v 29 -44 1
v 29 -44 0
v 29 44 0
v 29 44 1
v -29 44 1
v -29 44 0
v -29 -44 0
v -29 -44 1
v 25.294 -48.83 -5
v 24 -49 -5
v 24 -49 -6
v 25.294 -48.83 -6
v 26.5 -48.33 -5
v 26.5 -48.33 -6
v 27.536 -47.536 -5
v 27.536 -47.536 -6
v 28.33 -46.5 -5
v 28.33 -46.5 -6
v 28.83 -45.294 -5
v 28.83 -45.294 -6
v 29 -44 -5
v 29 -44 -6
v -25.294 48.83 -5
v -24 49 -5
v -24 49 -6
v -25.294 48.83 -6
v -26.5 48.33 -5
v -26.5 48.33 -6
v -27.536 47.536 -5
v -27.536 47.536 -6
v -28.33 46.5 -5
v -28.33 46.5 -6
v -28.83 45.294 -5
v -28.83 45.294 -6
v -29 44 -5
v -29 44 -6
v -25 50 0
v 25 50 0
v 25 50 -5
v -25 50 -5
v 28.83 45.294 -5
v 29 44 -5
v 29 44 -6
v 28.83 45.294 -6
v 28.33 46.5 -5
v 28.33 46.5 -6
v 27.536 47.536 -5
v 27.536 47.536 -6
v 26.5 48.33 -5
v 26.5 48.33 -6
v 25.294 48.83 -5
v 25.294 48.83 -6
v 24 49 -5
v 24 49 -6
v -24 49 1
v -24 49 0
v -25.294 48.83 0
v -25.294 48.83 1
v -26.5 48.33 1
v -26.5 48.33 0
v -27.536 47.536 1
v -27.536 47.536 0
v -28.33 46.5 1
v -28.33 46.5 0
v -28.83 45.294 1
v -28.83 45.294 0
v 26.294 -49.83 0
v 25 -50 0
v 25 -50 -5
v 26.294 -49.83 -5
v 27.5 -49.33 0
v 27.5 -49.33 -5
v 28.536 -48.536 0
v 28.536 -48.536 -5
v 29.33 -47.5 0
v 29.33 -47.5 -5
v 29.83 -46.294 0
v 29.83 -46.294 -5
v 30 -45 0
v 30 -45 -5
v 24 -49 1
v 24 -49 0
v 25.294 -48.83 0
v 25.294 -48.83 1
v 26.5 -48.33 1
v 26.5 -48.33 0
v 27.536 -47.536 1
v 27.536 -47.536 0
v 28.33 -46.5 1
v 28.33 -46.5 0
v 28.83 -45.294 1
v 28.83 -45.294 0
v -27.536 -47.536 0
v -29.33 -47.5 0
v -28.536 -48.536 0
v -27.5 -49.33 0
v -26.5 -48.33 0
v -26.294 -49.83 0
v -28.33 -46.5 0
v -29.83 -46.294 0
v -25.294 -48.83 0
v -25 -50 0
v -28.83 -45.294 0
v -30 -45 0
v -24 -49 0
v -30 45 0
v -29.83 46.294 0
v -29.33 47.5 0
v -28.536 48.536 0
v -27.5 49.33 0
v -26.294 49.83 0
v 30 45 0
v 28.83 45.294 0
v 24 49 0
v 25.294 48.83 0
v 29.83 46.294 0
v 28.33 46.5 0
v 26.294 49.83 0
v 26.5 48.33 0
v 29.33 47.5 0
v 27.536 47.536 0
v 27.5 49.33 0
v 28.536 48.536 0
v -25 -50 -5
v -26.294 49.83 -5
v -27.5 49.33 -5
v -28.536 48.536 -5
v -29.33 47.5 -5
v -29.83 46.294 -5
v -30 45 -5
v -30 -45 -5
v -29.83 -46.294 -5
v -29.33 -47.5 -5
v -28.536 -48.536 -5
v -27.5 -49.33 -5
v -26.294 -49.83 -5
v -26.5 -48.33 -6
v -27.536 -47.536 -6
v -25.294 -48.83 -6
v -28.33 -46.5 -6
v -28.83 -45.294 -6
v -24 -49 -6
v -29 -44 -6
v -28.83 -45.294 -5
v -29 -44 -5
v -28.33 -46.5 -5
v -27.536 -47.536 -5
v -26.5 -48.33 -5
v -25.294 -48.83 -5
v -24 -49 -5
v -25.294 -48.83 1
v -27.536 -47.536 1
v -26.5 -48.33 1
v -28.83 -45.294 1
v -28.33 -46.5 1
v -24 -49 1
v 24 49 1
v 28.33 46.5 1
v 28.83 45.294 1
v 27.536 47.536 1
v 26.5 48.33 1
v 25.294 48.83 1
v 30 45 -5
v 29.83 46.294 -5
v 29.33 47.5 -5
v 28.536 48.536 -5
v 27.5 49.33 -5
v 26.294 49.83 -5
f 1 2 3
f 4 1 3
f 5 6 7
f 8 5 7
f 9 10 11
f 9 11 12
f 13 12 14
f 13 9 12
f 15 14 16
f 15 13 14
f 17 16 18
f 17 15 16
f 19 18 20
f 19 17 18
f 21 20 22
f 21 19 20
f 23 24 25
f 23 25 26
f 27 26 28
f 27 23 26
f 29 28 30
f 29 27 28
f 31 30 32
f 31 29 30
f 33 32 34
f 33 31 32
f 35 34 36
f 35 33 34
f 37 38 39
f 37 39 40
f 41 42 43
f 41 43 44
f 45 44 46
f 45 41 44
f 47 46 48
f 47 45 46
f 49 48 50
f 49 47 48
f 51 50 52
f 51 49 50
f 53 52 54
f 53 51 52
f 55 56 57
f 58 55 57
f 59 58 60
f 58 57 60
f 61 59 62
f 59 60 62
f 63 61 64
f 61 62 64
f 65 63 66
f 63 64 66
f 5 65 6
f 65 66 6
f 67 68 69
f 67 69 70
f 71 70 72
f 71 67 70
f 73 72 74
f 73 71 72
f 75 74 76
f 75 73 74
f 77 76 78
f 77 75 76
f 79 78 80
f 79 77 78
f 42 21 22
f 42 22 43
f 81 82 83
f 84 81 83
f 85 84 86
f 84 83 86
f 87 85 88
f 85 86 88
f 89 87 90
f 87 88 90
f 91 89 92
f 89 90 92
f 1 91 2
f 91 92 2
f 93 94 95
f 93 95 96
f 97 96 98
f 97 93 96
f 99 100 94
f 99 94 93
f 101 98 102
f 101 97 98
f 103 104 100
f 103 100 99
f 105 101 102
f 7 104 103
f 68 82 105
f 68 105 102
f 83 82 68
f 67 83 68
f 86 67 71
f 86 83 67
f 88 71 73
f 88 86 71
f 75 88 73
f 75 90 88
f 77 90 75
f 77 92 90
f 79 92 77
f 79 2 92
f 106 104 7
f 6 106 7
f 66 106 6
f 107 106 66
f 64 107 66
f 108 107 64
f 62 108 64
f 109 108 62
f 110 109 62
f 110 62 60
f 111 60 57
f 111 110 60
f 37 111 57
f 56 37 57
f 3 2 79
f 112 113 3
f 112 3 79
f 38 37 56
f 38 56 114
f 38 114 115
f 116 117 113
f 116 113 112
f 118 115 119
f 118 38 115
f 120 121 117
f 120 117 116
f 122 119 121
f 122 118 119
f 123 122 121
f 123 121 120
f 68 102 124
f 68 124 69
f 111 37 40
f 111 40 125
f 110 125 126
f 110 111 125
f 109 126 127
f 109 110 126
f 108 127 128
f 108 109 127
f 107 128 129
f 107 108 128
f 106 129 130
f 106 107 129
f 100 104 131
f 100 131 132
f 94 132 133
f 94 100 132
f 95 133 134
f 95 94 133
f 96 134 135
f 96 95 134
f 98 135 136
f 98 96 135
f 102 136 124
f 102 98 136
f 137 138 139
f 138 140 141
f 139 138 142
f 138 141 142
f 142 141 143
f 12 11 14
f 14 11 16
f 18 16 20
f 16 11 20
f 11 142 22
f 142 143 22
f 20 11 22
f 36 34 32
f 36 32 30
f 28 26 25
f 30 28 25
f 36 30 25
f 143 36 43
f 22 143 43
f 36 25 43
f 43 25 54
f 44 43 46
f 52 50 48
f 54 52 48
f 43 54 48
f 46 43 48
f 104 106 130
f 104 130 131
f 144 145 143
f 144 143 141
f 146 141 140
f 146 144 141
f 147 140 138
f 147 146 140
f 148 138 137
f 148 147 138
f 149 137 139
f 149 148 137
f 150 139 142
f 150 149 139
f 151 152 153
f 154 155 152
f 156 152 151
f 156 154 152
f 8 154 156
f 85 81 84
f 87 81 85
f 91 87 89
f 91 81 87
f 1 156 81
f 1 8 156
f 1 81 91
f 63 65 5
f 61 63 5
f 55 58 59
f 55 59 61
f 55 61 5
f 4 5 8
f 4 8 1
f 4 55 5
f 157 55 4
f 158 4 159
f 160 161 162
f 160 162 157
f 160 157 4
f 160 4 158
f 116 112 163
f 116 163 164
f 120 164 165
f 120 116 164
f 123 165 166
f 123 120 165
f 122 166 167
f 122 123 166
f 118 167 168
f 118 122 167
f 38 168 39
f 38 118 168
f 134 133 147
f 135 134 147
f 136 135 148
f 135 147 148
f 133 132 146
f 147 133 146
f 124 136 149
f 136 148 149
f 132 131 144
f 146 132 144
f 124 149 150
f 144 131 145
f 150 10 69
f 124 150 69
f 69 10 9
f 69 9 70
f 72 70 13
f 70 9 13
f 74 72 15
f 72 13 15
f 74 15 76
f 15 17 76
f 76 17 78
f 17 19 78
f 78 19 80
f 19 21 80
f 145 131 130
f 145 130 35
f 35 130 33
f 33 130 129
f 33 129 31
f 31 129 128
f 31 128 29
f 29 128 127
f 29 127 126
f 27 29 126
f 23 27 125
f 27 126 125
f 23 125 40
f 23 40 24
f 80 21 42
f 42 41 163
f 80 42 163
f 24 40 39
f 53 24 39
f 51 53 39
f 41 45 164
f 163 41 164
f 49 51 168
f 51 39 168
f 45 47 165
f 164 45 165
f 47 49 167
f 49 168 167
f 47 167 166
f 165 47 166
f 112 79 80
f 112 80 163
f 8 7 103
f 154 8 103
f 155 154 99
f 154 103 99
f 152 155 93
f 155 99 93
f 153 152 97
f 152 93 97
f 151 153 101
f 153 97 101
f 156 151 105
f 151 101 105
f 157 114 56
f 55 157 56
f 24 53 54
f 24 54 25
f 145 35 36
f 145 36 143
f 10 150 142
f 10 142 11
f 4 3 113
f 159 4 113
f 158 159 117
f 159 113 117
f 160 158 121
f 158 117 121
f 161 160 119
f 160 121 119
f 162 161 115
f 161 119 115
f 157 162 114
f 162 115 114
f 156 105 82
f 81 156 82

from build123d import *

# Parameters (mm, degrees)
F1_DEPTH = 1
F2_DEPTH = 5
F3_DEPTH = 7


with BuildPart() as f1:
    # F0 (on Top) → F1 (new body)
    with BuildSketch(Plane.XY):
        with BuildLine():
            Line((-29, 44), (-29, 0))
            Line((-29, 0), (-29, -44))
            ThreePointArc((-29, -44), (-27.535534, -47.535534), (-24, -49))
            Line((-24, -49), (0, -49))
            Line((0, -49), (24, -49))
            ThreePointArc((24, -49), (27.535534, -47.535534), (29, -44))
            Line((29, -44), (29, 0))
            Line((29, 0), (29, 44))
            ThreePointArc((29, 44), (27.535534, 47.535534), (24, 49))
            Line((24, 49), (0, 49))
            Line((0, 49), (-24, 49))
            ThreePointArc((-24, 49), (-27.535534, 47.535534), (-29, 44))
        make_face()
    extrude(amount=F1_DEPTH)

    # F0 (on Top) → F2 (join)
    with BuildSketch(Plane.XY):
        with BuildLine():
            Line((-30, 45), (-30, 0))
            Line((-30, 0), (-30, -45))
            ThreePointArc((-30, -45), (-28.535534, -48.535534), (-25, -50))
            Line((-25, -50), (25, -50))
            ThreePointArc((25, -50), (28.535534, -48.535534), (30, -45))
            Line((30, -45), (30, 0))
            Line((30, 0), (30, 45))
            ThreePointArc((30, 45), (28.535534, 48.535534), (25, 50))
            Line((25, 50), (-25, 50))
            ThreePointArc((-25, 50), (-28.535534, 48.535534), (-30, 45))
        make_face()
        with BuildLine():
            Line((-29, -44), (-29, 0))
            Line((-29, 0), (-29, 44))
            ThreePointArc((-29, 44), (-27.535534, 47.535534), (-24, 49))
            Line((-24, 49), (0, 49))
            Line((0, 49), (24, 49))
            ThreePointArc((24, 49), (27.535534, 47.535534), (29, 44))
            Line((29, 44), (29, 0))
            Line((29, 0), (29, -44))
            ThreePointArc((29, -44), (27.535534, -47.535534), (24, -49))
            Line((24, -49), (0, -49))
            Line((0, -49), (-24, -49))
            ThreePointArc((-24, -49), (-27.535534, -47.535534), (-29, -44))
        make_face(mode=Mode.SUBTRACT)
        with BuildLine():
            Line((-29, 44), (-29, 0))
            Line((-29, 0), (-29, -44))
            ThreePointArc((-29, -44), (-27.535534, -47.535534), (-24, -49))
            Line((-24, -49), (0, -49))
            Line((0, -49), (24, -49))
            ThreePointArc((24, -49), (27.535534, -47.535534), (29, -44))
            Line((29, -44), (29, 0))
            Line((29, 0), (29, 44))
            ThreePointArc((29, 44), (27.535534, 47.535534), (24, 49))
            Line((24, 49), (0, 49))
            Line((0, 49), (-24, 49))
            ThreePointArc((-24, 49), (-27.535534, 47.535534), (-29, 44))
        make_face()
    extrude(amount=-F2_DEPTH)

    # F1_face (on face) → F3 (join)
    with BuildSketch(Plane.XY.offset(1)):
        with BuildLine():
            Line((-29, 44), (-29, -44))
            ThreePointArc((-29, -44), (-27.535534, -47.535534), (-24, -49))
            Line((-24, -49), (24, -49))
            ThreePointArc((24, -49), (27.535534, -47.535534), (29, -44))
            Line((29, -44), (29, 44))
            ThreePointArc((29, 44), (27.535534, 47.535534), (24, 49))
            Line((24, 49), (-24, 49))
            ThreePointArc((-24, 49), (-27.535534, 47.535534), (-29, 44))
        make_face()
    extrude(amount=-F3_DEPTH)


solid = f1.part
